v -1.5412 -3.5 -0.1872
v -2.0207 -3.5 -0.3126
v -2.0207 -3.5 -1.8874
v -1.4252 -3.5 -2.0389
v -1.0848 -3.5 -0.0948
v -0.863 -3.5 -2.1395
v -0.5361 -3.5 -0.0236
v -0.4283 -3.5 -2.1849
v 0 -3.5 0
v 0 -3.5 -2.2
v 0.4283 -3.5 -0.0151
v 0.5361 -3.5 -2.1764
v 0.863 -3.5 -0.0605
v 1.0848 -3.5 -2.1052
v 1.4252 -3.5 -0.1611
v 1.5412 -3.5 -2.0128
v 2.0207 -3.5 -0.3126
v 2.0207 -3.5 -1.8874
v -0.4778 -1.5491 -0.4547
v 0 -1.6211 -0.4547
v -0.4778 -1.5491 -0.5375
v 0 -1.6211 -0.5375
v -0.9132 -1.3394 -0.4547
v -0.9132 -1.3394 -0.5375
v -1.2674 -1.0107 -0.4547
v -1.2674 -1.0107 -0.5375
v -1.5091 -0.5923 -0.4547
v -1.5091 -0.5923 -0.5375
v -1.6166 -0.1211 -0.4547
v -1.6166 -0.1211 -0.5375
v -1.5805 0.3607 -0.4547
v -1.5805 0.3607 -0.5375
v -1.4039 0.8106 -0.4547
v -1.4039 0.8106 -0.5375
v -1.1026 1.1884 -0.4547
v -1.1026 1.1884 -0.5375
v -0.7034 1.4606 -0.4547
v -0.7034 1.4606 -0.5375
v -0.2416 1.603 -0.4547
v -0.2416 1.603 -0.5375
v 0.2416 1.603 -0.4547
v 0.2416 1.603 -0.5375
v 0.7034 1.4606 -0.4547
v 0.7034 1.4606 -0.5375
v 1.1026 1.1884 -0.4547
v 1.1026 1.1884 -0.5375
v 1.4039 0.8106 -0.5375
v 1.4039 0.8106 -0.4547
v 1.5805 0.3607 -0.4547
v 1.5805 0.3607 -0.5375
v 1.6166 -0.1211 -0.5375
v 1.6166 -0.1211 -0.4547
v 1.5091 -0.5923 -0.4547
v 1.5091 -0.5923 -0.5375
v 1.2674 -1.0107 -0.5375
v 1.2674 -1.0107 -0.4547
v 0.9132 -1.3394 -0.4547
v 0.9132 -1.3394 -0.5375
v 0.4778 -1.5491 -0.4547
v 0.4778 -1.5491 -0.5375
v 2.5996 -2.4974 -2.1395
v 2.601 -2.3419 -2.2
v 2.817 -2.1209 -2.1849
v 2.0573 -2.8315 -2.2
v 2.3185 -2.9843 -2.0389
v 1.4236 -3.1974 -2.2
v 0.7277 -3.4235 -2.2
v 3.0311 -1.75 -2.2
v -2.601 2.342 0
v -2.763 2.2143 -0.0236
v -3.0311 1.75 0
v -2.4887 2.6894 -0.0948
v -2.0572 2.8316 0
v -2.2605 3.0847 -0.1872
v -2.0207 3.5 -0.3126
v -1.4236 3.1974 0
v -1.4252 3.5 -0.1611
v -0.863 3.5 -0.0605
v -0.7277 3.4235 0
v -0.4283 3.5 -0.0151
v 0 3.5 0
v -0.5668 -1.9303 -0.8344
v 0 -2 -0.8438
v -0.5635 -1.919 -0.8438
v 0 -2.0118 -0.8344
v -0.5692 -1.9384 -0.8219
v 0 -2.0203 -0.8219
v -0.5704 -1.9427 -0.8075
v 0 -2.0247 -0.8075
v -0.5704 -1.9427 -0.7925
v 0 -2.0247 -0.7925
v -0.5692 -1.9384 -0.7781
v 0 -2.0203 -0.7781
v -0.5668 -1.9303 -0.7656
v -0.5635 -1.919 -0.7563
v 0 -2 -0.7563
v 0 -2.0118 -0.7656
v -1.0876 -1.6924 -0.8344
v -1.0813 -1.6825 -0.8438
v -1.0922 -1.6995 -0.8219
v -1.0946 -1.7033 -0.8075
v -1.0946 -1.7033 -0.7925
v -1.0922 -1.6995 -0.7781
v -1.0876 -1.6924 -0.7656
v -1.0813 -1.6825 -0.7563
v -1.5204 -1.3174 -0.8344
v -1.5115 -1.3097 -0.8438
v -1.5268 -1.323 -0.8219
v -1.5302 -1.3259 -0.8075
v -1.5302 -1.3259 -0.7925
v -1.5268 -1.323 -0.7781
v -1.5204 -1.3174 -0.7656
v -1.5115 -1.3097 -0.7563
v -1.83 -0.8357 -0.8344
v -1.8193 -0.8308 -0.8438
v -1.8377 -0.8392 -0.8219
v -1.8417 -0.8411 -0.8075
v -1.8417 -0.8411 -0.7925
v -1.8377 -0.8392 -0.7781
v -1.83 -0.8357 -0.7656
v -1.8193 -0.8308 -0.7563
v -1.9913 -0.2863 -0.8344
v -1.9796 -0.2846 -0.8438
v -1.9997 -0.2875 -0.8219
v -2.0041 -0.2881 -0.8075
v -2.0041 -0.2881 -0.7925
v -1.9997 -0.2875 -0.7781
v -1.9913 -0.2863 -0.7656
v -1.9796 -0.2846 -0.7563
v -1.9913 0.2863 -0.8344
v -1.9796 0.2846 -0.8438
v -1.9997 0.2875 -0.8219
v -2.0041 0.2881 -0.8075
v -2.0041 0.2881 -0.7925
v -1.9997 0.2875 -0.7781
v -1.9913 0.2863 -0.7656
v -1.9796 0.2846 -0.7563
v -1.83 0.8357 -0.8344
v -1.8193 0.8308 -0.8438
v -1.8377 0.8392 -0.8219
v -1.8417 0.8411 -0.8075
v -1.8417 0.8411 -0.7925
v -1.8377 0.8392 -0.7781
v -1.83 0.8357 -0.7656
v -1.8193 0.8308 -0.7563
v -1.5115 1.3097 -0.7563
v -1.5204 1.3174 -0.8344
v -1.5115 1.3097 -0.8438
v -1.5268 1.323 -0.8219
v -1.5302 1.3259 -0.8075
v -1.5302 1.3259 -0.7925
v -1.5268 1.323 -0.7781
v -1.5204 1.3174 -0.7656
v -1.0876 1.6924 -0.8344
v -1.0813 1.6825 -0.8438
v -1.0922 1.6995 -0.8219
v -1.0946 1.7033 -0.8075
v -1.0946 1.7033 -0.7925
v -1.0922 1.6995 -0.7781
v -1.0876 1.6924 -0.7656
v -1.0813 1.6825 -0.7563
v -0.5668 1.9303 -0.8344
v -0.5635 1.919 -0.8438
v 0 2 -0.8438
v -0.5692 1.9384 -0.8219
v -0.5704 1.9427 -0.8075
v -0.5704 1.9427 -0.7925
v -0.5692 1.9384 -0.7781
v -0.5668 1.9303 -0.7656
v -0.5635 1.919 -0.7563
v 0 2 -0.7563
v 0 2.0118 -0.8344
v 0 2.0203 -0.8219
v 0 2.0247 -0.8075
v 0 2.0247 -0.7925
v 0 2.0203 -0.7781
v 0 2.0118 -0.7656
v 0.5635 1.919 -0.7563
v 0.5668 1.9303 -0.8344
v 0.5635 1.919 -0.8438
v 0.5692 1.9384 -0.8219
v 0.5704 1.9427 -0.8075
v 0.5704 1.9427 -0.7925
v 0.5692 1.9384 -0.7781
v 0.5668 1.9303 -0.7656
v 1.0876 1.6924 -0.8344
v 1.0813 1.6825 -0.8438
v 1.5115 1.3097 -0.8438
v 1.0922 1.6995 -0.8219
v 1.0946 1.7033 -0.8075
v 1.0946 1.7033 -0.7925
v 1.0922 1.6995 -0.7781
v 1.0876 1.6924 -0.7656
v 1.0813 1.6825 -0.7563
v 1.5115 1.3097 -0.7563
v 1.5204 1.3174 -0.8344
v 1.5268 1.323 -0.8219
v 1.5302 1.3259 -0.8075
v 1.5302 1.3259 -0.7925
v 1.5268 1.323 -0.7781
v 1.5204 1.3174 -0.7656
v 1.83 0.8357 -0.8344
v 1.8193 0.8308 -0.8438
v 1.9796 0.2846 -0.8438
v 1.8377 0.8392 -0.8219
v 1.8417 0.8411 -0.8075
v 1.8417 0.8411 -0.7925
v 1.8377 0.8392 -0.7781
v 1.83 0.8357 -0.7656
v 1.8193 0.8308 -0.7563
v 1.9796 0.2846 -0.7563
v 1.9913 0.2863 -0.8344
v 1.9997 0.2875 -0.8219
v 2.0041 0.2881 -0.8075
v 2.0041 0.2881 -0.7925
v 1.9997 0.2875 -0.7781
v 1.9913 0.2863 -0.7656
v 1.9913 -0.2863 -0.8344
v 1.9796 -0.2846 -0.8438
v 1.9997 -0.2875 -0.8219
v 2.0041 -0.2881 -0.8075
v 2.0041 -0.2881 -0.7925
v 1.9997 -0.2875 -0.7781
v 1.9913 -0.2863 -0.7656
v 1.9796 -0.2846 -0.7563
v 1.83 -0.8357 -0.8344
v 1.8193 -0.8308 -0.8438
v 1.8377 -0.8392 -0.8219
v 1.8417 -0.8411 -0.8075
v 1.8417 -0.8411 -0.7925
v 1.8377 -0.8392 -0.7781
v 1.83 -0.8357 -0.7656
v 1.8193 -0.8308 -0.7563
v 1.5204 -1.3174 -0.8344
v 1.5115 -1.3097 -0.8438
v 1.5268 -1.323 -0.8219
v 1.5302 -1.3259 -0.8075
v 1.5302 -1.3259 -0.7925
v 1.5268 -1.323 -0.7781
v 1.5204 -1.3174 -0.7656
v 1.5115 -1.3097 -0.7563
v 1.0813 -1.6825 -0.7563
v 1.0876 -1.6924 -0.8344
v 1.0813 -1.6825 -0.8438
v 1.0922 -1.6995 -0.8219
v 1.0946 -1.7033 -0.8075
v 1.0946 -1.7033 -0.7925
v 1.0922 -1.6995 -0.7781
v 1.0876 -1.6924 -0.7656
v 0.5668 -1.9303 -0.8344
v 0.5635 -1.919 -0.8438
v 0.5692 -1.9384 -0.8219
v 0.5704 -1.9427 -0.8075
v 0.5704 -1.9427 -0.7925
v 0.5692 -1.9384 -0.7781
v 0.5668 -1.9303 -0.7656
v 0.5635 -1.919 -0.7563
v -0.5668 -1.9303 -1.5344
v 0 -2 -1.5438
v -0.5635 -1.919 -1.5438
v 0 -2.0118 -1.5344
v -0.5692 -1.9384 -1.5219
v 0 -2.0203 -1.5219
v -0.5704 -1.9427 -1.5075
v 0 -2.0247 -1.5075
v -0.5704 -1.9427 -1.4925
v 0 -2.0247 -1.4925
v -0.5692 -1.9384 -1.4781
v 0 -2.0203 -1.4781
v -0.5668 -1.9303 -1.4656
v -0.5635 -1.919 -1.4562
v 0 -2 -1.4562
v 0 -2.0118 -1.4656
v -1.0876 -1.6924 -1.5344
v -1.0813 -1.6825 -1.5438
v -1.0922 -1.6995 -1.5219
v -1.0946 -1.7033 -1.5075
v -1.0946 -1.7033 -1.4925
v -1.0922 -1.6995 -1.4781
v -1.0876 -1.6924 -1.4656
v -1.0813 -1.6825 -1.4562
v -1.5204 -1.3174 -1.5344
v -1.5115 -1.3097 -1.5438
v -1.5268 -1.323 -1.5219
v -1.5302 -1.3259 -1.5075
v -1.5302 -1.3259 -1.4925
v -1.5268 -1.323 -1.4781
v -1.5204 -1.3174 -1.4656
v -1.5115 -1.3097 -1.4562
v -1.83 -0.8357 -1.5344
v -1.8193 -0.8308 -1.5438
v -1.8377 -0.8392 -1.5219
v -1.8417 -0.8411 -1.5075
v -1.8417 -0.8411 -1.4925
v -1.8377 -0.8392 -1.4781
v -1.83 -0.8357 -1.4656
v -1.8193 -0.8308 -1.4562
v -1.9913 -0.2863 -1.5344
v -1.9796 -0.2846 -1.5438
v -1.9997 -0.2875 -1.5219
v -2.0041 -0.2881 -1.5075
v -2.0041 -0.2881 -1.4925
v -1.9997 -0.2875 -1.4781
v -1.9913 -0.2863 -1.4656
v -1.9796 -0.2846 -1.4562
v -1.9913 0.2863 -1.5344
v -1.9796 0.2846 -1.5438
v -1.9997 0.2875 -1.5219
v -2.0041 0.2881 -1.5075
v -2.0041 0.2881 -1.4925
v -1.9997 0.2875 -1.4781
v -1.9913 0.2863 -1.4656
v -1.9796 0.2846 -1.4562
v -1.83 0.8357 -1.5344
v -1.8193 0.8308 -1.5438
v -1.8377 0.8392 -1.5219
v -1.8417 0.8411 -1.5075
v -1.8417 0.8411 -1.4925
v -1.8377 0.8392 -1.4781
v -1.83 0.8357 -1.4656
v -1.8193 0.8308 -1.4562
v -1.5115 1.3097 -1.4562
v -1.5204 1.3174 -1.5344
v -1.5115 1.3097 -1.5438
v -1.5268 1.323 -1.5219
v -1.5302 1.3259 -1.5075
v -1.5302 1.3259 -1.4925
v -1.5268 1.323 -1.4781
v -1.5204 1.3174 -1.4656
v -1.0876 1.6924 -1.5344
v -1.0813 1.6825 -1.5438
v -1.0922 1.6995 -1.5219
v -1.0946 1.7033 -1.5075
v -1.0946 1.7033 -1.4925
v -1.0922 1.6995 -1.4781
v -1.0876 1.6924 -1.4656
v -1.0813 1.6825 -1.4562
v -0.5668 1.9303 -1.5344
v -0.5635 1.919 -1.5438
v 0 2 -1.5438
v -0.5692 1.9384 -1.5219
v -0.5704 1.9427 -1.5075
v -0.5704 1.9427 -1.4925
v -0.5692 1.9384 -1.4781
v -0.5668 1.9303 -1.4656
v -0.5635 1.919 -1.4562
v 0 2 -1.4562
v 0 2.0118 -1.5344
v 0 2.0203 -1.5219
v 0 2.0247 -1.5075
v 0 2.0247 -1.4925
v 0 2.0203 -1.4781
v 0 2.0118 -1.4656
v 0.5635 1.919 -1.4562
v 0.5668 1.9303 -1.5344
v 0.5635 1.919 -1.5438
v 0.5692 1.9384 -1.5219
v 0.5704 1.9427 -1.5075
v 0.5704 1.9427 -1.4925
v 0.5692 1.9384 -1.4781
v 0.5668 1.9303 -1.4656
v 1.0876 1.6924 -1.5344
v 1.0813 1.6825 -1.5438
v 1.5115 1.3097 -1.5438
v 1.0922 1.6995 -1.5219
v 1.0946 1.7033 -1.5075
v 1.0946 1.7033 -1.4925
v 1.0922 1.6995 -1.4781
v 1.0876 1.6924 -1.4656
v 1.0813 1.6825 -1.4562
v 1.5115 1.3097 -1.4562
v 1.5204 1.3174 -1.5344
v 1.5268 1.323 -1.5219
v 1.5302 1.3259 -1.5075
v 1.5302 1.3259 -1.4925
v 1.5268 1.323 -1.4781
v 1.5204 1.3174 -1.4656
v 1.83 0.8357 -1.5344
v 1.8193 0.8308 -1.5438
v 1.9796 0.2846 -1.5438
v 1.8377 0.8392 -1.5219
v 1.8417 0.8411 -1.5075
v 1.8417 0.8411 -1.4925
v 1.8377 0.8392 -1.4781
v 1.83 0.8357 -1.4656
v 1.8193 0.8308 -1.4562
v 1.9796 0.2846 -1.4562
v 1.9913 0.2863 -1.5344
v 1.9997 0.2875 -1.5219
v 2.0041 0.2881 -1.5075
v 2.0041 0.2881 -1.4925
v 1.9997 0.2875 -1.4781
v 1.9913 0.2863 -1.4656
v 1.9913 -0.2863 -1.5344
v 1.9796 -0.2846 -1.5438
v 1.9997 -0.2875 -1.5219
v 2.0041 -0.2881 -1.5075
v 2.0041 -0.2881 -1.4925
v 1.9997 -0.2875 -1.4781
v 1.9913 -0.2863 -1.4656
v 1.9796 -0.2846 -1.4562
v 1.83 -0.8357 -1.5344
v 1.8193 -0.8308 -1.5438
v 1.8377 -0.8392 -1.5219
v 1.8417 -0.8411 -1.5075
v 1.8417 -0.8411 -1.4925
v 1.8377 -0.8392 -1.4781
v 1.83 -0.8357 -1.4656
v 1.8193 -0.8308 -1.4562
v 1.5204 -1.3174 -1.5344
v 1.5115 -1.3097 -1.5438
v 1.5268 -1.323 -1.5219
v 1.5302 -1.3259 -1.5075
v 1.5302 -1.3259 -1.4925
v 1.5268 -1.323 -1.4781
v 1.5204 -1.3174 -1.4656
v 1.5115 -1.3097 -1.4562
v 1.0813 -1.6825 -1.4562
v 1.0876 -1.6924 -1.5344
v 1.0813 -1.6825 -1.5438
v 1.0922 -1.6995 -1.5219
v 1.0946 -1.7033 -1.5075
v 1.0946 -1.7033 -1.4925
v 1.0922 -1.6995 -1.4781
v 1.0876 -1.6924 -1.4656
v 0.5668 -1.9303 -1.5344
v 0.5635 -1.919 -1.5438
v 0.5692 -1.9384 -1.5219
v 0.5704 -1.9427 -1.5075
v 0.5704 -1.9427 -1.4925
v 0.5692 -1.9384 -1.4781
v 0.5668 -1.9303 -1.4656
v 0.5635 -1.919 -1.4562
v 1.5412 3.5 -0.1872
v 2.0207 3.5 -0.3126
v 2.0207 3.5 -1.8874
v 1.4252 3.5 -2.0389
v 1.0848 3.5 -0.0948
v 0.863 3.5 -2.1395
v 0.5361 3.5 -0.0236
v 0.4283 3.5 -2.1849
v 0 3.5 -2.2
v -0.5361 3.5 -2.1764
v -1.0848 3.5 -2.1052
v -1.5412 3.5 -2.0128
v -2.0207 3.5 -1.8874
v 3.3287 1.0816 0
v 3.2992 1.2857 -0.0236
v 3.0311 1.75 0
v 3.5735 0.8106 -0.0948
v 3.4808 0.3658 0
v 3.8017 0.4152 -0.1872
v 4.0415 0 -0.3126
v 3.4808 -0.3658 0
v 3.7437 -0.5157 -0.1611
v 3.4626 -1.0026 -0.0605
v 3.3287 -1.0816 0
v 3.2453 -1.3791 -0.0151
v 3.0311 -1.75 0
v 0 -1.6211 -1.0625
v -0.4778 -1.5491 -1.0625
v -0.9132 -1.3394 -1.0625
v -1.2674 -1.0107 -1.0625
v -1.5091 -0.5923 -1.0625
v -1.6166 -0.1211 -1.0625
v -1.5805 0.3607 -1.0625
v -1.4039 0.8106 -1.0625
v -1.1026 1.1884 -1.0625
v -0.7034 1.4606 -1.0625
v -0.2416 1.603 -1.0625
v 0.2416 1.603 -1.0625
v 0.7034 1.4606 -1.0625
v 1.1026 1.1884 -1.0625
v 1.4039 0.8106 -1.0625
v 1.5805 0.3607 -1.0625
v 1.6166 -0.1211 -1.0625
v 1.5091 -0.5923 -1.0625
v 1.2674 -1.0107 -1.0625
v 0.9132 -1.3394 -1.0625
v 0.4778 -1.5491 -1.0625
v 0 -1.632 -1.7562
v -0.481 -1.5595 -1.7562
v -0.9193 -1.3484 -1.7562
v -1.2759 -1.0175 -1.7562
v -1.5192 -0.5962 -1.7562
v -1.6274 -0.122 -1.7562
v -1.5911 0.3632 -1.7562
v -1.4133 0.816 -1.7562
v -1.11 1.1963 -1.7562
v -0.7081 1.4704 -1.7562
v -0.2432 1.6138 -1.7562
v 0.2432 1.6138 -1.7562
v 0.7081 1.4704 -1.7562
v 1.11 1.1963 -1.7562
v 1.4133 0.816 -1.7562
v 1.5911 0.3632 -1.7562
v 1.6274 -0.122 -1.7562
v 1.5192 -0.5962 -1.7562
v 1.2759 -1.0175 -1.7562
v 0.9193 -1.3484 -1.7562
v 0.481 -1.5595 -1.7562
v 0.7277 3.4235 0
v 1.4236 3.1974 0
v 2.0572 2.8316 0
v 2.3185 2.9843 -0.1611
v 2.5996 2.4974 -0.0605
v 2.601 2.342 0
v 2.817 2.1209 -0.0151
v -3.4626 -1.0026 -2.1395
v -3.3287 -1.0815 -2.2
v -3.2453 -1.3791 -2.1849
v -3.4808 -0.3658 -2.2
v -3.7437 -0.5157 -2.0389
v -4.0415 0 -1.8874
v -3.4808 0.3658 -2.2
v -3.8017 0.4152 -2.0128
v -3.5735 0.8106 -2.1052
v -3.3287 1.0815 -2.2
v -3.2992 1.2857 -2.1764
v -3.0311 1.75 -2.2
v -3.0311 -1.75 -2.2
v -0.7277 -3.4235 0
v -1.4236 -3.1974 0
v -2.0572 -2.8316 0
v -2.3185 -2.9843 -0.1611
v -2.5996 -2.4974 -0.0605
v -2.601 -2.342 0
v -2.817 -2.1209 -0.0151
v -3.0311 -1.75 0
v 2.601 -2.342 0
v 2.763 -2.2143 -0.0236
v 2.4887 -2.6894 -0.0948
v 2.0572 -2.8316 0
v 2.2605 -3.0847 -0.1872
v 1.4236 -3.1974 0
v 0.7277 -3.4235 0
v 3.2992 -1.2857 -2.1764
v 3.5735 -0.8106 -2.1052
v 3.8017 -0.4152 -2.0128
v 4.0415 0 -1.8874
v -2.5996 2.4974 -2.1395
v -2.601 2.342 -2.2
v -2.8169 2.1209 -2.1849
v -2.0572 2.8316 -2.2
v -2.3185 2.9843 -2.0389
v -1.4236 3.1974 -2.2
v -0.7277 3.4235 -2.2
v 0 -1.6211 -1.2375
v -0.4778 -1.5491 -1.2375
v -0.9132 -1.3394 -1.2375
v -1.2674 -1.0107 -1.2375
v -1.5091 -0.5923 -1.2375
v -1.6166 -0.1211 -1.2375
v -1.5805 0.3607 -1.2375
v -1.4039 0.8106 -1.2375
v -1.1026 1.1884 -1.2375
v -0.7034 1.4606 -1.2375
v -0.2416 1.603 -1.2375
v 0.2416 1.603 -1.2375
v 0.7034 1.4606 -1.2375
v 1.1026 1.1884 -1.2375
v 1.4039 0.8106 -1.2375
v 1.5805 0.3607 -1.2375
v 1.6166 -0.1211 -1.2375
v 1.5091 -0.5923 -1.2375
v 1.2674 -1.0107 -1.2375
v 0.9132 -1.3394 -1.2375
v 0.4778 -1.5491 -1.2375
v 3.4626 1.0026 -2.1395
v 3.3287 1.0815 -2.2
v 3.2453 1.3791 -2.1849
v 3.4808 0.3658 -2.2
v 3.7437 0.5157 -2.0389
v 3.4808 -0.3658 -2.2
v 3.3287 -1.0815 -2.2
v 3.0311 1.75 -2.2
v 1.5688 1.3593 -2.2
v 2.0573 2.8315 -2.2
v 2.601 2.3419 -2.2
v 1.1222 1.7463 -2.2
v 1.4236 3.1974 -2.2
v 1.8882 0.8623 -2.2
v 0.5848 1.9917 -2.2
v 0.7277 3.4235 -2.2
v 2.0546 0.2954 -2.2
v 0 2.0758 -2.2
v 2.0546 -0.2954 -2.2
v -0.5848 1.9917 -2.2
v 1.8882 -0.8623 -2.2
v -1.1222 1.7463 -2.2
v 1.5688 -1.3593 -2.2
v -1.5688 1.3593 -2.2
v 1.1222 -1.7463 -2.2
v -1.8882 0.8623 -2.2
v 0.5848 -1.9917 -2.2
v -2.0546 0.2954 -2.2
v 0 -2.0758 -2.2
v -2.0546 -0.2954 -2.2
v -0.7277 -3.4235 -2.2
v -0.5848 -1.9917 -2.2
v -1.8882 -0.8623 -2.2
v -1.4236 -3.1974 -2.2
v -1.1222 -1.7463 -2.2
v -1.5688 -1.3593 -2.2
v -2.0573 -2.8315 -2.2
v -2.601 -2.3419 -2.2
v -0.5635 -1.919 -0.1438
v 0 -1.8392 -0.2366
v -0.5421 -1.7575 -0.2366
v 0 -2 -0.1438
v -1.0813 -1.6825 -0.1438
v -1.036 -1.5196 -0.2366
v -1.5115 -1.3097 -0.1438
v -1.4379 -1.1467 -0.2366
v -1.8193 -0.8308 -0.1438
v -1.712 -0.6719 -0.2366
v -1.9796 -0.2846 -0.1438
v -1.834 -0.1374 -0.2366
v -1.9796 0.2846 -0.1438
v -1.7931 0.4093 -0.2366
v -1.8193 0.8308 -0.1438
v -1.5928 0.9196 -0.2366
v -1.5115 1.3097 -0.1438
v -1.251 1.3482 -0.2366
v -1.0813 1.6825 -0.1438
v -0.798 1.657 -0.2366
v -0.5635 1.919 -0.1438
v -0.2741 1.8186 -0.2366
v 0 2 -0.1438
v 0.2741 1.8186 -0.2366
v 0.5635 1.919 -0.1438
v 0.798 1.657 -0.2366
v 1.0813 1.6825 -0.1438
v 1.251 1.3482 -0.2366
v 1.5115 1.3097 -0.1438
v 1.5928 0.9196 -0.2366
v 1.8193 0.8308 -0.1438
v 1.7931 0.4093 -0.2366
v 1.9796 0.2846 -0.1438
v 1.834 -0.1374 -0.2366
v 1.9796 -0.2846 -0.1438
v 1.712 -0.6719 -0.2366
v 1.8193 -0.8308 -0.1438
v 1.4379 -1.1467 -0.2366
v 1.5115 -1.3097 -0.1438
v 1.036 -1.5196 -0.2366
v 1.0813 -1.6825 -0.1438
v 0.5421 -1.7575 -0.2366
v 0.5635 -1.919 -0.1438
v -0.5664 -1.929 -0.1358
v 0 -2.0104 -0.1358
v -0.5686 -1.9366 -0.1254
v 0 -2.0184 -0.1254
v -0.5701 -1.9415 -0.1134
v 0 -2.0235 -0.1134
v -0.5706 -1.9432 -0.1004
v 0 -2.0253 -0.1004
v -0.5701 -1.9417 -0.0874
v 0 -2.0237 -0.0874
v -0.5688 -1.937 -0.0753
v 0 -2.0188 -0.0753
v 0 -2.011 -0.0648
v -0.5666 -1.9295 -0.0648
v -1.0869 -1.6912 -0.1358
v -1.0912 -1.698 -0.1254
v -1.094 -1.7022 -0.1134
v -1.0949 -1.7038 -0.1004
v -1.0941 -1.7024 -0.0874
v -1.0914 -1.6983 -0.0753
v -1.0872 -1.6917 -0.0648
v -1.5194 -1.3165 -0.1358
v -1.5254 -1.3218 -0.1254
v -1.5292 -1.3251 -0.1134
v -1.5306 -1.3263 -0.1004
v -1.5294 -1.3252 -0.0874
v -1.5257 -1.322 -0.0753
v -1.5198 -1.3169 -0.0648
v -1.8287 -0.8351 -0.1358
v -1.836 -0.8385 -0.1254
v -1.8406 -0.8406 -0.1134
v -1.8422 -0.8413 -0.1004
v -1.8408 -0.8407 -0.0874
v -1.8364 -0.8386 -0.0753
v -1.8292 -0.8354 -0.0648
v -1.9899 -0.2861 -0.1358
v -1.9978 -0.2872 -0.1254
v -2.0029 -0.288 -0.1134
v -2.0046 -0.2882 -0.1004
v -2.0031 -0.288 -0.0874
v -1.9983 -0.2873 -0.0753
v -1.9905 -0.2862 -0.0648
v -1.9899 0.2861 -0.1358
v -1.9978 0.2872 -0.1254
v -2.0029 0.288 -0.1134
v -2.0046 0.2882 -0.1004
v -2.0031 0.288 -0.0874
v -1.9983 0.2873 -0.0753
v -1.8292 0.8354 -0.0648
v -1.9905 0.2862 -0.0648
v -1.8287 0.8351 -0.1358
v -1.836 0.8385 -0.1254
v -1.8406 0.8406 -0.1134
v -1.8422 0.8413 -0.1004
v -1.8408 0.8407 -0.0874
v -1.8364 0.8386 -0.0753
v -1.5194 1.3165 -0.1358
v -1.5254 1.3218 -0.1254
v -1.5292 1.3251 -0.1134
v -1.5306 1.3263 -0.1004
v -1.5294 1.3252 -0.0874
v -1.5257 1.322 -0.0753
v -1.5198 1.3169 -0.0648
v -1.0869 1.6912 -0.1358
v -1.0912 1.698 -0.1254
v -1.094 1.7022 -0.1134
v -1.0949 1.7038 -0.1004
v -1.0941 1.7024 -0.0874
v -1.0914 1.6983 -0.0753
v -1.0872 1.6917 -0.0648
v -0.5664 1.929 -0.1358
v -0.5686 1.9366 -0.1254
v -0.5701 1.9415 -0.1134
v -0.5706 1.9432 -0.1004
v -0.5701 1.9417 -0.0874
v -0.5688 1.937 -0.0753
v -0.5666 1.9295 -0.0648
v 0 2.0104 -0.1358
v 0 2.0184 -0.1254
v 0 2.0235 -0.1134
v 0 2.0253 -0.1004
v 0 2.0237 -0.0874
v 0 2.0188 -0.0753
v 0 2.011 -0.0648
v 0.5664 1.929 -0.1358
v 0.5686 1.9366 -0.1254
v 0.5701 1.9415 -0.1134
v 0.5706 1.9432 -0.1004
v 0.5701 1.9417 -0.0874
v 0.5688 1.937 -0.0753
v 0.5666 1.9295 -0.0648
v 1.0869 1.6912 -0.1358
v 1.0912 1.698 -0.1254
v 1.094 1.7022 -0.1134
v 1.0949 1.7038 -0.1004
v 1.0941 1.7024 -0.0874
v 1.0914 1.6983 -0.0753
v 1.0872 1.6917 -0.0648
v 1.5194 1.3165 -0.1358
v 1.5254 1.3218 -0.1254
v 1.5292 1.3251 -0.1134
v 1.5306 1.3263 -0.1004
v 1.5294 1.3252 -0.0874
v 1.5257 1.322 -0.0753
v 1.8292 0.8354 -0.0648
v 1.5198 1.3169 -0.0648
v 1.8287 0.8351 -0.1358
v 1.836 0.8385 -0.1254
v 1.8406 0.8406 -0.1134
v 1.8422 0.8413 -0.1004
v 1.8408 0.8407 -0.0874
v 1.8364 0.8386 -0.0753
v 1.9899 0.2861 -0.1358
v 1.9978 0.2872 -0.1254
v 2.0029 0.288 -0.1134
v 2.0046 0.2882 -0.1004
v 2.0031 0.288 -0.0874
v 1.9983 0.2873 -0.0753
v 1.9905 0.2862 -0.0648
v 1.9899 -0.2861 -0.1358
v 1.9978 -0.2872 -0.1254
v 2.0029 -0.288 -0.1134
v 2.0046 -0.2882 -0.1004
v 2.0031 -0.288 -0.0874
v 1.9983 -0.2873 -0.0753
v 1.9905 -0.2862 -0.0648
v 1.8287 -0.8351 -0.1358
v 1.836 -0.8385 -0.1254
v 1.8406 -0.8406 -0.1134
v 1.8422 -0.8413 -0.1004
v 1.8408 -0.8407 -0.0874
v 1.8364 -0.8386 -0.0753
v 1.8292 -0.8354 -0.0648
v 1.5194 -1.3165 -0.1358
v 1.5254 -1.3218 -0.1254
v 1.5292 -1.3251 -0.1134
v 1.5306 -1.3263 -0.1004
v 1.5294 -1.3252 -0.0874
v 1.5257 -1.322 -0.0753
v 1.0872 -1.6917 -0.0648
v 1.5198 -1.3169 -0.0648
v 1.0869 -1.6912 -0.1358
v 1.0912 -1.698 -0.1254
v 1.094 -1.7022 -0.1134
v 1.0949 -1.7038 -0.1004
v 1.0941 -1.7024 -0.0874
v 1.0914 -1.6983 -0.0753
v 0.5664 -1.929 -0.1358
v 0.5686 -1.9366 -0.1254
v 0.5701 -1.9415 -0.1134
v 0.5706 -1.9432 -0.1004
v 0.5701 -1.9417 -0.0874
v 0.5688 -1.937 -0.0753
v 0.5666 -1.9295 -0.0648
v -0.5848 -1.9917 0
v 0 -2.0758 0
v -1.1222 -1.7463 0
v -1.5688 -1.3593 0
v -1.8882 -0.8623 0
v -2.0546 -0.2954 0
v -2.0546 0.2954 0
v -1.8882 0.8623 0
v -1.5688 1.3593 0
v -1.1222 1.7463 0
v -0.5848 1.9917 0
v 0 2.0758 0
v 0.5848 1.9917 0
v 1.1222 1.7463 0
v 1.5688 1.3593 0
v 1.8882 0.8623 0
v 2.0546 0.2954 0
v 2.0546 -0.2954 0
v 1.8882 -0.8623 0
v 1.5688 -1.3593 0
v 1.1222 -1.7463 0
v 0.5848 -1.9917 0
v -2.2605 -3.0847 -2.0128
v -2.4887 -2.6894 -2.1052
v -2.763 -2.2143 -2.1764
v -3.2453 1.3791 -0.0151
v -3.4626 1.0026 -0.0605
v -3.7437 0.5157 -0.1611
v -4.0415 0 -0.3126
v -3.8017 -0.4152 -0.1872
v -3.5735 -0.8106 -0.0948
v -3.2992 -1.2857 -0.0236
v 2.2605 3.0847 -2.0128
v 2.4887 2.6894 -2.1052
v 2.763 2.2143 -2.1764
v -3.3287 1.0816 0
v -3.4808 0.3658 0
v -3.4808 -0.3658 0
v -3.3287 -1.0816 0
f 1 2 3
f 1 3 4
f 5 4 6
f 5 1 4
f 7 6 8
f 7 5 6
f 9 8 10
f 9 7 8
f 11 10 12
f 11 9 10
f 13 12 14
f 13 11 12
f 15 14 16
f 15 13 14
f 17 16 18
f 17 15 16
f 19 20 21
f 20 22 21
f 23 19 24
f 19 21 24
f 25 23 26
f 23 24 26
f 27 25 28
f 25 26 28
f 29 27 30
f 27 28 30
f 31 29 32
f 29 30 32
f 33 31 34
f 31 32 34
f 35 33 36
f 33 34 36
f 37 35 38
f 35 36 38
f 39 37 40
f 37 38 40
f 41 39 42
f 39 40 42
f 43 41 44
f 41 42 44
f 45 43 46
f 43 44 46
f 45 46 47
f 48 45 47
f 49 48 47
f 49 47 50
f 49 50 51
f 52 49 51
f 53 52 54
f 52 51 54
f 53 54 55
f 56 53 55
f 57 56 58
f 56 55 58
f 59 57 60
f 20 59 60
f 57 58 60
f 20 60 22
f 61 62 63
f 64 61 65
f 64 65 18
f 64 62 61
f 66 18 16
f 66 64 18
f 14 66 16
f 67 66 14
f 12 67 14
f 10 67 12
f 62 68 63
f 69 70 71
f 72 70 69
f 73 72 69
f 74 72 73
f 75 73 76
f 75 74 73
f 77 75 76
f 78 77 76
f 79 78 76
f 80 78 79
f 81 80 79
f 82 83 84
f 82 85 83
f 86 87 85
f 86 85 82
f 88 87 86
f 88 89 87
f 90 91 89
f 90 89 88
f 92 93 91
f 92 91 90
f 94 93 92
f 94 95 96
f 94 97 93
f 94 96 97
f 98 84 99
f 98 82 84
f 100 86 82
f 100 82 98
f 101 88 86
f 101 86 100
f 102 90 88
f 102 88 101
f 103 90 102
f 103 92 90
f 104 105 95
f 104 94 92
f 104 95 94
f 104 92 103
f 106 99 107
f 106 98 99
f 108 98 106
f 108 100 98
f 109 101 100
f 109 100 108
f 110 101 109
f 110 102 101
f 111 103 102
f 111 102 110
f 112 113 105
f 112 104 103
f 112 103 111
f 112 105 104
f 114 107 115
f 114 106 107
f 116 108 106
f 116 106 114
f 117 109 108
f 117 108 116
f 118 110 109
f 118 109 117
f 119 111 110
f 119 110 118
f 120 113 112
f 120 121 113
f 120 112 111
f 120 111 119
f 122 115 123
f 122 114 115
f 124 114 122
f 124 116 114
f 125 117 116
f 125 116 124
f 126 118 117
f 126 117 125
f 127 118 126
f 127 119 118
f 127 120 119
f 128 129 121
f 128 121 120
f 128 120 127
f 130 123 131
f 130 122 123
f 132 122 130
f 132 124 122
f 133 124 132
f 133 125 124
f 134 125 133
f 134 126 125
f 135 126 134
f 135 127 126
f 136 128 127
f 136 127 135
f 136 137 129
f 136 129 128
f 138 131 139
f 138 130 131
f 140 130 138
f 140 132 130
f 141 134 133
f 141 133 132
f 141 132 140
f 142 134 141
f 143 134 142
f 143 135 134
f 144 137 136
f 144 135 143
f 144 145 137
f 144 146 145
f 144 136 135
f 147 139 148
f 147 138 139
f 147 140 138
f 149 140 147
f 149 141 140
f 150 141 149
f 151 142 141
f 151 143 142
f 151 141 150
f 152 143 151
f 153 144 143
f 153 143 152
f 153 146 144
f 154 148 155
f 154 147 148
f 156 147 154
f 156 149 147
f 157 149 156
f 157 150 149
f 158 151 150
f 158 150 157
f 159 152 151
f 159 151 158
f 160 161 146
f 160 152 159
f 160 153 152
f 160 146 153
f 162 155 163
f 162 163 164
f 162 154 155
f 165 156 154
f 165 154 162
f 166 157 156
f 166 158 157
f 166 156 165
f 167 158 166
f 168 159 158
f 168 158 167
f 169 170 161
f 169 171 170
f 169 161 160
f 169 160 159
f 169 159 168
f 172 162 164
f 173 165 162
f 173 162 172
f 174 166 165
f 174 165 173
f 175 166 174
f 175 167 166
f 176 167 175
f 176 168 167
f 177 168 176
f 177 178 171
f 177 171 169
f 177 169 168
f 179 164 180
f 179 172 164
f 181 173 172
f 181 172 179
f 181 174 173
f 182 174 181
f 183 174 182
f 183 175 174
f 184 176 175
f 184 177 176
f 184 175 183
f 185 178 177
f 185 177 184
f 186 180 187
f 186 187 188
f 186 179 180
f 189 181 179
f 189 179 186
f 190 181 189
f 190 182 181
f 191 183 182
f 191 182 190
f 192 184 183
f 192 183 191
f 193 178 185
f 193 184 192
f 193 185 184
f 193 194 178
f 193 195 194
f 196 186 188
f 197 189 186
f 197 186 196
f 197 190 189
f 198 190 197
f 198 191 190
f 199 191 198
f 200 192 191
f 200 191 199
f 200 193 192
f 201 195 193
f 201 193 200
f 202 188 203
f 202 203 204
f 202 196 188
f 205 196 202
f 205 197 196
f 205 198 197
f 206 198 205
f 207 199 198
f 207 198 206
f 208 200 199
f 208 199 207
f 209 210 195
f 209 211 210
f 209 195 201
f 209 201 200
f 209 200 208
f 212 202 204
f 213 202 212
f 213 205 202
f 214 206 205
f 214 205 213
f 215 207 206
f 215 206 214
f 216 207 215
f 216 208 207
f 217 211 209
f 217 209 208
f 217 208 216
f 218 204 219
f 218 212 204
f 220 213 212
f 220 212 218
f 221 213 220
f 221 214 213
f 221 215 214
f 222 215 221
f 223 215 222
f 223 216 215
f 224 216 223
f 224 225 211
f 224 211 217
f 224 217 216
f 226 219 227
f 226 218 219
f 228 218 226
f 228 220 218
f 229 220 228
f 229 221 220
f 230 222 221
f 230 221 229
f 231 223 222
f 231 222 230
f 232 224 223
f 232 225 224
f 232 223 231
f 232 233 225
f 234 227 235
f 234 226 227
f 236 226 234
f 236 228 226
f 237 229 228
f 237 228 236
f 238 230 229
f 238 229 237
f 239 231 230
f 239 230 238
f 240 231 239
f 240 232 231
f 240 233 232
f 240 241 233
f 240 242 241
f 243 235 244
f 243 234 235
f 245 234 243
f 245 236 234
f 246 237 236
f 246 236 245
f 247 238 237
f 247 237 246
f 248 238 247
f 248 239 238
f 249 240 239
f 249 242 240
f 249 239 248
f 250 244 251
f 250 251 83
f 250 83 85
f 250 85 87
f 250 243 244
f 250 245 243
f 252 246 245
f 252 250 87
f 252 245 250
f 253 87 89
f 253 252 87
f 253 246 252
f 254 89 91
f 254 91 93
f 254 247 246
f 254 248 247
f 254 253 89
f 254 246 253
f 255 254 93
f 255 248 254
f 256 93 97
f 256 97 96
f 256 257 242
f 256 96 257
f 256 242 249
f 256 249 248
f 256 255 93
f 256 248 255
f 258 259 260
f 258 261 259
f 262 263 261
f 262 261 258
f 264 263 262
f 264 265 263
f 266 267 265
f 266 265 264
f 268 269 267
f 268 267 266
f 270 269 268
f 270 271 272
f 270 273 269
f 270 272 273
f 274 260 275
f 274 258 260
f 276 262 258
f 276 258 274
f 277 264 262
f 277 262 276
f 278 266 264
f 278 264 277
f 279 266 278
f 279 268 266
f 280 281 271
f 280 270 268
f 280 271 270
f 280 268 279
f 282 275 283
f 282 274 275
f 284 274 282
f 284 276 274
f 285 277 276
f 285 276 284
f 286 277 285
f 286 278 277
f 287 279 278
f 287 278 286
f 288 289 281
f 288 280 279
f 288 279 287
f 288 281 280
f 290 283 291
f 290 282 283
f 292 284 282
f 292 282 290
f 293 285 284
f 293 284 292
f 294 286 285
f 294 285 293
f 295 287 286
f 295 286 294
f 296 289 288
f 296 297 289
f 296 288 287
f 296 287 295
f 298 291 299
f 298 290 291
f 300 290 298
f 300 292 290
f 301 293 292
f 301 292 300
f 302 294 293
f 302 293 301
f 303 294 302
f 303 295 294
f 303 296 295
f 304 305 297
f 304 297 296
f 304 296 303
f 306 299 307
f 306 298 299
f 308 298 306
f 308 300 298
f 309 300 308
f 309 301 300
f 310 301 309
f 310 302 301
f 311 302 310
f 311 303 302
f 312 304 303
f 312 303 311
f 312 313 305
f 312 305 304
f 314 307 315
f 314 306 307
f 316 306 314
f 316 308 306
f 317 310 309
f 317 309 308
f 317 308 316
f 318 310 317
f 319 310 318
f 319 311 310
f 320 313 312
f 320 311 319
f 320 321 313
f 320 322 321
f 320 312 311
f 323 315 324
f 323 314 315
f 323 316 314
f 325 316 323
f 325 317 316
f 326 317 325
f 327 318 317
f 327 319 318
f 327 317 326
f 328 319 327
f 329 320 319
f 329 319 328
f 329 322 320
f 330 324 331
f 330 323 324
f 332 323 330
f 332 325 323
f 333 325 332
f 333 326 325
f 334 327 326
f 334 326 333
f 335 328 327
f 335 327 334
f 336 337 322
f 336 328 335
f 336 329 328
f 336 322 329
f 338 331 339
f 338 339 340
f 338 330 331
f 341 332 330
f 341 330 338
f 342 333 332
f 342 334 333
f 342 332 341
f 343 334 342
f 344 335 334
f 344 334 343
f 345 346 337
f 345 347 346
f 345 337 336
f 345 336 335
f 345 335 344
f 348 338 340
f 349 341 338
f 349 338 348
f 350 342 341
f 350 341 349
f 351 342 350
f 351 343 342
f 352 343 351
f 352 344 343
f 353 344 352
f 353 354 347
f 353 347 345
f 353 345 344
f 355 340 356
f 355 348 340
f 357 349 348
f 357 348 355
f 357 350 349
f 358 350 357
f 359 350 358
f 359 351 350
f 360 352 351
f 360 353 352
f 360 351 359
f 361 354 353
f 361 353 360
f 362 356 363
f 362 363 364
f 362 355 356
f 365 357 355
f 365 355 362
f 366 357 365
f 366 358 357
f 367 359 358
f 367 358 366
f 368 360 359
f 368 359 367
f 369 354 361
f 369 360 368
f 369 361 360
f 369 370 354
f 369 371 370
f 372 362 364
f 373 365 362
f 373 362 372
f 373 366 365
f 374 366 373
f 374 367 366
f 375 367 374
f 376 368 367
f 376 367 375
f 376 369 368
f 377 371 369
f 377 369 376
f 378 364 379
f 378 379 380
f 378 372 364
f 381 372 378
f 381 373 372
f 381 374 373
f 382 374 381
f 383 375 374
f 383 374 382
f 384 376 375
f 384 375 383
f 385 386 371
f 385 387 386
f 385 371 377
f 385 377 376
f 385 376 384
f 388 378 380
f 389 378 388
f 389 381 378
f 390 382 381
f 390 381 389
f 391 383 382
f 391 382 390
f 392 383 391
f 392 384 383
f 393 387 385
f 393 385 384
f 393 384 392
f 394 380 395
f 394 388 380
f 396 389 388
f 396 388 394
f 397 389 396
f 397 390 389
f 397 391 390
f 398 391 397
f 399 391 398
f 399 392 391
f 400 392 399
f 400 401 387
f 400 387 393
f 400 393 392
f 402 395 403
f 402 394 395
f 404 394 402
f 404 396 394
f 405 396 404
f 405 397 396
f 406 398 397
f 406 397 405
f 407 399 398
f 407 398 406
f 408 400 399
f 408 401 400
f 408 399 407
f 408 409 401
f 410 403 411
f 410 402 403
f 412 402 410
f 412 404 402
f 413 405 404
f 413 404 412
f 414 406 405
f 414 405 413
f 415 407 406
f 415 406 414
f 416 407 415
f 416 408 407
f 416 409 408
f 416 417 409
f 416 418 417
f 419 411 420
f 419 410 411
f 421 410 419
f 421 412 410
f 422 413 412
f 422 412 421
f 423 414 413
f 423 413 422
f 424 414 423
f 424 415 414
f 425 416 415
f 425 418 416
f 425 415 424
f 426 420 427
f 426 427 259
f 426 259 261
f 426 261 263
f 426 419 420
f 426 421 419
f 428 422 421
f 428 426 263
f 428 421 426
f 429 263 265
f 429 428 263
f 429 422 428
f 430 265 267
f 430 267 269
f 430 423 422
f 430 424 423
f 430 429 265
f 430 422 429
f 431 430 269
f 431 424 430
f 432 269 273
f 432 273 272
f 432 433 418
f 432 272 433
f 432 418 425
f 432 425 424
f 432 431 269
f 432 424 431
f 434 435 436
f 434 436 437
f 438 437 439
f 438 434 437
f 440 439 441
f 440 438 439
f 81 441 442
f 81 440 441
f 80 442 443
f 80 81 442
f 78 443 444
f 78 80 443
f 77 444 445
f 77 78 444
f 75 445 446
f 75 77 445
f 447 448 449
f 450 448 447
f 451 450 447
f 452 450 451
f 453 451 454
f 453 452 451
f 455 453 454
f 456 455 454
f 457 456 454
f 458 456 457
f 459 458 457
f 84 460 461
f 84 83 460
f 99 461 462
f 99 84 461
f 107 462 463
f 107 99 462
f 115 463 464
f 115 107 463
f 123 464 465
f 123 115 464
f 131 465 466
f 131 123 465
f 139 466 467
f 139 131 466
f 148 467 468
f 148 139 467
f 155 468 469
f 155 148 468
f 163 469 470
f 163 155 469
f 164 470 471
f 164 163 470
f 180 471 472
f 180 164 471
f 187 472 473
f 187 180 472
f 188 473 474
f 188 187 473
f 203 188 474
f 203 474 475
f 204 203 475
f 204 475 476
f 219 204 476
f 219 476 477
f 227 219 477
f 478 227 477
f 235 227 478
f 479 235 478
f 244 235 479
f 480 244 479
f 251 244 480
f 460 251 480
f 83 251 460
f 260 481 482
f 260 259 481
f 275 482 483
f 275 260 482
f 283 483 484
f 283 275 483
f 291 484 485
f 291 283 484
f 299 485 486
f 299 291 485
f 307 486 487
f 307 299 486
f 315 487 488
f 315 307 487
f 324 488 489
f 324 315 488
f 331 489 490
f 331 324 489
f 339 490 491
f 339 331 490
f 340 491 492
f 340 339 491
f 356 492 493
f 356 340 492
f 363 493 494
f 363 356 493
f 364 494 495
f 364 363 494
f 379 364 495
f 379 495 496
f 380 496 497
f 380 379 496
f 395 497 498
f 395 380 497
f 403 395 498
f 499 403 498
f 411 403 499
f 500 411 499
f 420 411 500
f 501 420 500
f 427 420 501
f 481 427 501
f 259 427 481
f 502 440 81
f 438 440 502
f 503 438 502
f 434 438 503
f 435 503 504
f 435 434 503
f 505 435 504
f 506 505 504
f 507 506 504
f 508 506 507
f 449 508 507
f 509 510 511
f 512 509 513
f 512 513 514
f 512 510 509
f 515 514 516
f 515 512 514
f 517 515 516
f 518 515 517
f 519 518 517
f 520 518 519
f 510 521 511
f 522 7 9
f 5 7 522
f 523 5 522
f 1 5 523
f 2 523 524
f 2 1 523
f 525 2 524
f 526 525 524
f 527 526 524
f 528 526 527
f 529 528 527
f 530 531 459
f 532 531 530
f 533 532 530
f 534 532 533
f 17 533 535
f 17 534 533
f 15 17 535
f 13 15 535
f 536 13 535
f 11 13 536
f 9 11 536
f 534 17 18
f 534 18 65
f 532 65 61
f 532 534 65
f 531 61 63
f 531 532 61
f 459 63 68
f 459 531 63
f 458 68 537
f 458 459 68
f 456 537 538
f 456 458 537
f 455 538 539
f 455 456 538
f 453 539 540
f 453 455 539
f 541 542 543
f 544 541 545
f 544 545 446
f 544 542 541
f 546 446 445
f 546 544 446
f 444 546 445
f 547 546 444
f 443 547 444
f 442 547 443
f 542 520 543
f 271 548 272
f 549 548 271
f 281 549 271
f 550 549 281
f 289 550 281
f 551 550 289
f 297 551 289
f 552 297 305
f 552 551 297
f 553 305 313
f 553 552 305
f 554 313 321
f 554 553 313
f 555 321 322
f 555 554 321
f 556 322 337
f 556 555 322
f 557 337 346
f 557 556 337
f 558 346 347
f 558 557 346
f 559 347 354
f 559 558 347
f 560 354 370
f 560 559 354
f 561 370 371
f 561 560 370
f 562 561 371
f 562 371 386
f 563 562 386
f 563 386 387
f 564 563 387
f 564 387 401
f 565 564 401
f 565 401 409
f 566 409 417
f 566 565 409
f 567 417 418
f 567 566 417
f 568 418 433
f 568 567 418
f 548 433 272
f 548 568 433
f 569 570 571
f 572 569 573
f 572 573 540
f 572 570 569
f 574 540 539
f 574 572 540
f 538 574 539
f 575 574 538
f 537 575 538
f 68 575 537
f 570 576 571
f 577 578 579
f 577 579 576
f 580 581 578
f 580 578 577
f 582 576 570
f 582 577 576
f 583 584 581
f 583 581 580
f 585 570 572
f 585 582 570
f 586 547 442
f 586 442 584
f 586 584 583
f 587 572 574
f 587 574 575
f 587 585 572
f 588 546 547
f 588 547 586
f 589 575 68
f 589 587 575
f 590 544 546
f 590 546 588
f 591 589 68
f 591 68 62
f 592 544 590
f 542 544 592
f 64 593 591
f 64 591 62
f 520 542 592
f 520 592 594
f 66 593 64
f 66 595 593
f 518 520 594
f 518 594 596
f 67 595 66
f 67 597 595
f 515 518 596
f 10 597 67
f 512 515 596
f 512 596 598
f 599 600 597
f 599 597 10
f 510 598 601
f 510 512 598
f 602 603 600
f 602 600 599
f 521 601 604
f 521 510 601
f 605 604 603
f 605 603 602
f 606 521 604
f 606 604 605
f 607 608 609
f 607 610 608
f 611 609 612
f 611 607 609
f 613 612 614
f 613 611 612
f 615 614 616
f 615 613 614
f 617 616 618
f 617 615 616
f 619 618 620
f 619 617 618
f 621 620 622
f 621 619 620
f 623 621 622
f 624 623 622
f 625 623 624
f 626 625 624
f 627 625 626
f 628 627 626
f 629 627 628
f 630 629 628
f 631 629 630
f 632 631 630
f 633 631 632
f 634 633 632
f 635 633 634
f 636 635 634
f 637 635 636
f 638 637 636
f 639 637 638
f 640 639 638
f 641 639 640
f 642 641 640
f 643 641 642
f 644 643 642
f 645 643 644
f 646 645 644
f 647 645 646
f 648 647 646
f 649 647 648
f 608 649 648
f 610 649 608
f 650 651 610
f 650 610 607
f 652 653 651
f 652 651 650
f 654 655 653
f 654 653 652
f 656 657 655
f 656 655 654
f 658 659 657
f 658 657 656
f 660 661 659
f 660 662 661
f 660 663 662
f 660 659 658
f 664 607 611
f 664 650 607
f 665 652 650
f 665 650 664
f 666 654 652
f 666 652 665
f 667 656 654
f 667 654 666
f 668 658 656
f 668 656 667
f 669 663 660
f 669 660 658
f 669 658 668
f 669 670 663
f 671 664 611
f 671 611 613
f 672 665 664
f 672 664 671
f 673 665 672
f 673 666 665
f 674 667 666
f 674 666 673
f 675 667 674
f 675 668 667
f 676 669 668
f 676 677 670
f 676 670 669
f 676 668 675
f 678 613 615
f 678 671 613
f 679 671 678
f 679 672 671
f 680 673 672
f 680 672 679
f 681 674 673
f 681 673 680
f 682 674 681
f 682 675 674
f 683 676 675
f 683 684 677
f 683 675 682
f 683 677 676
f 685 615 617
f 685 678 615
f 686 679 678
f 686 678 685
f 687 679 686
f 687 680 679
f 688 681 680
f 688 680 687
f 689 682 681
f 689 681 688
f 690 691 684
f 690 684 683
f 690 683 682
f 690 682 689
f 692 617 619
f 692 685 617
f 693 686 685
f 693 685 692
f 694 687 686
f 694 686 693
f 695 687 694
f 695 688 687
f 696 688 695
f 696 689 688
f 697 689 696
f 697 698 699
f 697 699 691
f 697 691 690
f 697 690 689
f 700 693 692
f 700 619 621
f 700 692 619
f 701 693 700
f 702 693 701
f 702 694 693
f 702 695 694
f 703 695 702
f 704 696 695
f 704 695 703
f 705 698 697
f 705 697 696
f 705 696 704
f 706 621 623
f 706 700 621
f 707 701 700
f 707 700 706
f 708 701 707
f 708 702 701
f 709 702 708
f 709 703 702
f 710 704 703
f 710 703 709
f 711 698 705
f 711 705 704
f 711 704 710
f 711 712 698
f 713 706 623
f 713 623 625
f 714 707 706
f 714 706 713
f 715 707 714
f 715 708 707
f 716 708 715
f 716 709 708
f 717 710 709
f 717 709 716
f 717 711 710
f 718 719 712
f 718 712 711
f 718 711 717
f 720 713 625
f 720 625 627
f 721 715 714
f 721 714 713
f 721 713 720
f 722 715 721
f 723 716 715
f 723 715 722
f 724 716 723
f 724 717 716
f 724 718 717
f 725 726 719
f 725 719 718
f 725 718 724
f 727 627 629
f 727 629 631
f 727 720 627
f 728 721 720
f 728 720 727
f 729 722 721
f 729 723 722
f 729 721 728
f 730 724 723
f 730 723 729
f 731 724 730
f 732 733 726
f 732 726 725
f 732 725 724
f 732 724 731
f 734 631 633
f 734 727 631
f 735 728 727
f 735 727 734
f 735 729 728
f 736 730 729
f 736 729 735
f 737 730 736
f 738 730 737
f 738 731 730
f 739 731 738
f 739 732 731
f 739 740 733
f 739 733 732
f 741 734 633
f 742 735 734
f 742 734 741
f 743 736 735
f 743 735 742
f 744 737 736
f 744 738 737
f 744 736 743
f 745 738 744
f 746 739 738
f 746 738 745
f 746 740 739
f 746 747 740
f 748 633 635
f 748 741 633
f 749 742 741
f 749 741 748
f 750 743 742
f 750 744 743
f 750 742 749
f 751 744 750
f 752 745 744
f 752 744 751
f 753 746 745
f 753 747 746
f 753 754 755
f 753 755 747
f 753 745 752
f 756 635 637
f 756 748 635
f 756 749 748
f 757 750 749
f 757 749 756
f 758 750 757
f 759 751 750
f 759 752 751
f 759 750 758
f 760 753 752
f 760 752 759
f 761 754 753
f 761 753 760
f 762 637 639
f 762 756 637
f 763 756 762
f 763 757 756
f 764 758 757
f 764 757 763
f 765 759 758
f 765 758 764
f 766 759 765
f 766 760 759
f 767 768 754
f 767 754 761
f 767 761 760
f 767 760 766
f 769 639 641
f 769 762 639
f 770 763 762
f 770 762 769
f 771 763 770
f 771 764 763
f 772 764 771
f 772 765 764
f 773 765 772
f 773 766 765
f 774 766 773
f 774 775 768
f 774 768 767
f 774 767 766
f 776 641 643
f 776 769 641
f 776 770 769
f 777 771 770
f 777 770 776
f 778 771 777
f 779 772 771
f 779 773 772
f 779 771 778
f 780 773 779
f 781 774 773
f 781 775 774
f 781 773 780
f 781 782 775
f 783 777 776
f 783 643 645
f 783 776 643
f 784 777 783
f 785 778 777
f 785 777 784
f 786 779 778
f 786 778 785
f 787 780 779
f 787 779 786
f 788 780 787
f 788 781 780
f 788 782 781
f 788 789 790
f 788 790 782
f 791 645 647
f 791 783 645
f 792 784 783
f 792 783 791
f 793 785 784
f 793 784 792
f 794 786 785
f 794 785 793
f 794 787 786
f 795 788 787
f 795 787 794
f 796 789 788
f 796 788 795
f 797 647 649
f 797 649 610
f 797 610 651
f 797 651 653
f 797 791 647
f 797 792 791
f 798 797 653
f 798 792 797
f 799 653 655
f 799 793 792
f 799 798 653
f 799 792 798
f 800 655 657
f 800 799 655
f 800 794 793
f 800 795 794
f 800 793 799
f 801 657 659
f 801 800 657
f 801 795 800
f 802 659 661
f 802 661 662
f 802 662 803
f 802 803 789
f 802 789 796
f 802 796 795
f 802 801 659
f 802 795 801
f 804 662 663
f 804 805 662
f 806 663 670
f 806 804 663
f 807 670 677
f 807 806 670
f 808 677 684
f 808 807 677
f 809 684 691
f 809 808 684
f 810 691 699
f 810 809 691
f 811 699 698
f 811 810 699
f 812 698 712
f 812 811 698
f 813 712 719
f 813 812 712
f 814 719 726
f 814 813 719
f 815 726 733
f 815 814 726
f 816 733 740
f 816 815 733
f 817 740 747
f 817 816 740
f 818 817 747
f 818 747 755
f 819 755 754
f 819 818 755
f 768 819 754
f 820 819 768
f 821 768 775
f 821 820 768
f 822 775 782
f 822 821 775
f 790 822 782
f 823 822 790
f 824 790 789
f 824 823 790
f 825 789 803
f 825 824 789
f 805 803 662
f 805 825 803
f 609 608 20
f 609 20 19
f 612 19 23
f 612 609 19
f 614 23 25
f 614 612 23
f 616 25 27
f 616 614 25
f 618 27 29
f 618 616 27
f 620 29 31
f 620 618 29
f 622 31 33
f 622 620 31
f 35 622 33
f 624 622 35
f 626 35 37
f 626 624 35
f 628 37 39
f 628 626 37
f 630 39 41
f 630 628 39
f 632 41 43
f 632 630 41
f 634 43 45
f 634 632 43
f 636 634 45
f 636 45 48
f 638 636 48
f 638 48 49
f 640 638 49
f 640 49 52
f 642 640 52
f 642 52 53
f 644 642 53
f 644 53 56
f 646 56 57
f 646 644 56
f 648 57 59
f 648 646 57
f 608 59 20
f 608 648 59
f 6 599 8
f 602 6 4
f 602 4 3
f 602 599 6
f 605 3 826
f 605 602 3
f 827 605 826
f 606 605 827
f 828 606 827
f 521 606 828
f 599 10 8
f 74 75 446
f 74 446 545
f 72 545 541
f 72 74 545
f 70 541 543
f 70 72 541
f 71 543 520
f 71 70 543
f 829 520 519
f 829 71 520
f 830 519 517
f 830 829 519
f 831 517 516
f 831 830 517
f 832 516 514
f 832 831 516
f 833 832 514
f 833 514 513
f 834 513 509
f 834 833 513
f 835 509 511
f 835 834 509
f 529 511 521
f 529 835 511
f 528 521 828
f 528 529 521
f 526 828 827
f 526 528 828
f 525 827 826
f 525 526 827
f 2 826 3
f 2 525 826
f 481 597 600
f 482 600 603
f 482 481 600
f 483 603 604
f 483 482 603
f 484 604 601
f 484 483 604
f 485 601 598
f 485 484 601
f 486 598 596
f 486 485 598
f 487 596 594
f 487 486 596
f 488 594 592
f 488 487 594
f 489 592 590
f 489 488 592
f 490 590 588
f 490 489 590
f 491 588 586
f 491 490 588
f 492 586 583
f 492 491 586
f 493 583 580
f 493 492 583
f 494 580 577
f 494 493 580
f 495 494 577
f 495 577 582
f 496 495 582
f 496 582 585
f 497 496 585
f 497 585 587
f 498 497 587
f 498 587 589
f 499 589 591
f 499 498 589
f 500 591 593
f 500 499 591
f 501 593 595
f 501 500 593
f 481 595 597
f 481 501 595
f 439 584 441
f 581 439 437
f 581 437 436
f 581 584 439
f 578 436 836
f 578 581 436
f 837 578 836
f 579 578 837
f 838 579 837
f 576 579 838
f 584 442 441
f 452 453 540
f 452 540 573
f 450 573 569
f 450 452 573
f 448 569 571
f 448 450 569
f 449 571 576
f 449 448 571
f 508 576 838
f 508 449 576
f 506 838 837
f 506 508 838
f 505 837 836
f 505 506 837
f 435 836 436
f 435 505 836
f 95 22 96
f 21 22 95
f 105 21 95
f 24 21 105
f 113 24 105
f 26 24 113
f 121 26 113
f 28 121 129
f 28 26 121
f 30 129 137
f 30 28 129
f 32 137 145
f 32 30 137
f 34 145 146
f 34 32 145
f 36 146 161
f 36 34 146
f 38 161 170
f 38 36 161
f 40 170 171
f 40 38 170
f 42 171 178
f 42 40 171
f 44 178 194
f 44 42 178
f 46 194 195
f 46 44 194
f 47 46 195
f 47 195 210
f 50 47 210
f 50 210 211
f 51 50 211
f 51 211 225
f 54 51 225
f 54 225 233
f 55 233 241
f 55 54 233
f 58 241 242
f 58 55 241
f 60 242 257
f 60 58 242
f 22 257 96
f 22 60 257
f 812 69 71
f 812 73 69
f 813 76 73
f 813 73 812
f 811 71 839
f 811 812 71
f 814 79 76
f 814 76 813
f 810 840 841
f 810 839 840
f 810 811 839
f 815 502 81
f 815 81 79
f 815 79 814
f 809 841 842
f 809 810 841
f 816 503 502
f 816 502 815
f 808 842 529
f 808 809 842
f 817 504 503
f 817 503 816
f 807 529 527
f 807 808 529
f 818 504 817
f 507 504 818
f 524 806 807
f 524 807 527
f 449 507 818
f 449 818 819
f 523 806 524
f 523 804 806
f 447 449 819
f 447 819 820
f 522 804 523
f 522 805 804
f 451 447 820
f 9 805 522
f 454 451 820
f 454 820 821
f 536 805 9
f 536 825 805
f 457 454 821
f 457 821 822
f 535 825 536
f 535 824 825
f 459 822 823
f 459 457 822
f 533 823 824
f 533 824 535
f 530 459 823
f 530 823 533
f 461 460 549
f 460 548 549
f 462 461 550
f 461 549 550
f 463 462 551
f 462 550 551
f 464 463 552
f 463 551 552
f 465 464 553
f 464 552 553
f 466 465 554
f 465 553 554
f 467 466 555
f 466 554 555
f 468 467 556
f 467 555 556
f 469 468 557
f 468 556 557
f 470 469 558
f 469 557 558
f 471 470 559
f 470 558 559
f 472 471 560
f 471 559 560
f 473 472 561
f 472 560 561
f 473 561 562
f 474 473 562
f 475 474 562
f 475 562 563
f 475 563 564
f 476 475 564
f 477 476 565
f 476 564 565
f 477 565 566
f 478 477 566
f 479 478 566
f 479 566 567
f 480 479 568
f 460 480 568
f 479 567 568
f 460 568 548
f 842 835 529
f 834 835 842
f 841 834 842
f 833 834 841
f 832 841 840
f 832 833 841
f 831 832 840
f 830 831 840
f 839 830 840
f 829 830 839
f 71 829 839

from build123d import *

# Parameters (mm, degrees)
SKETCH5_W               = 2.2
SKETCH5_H               = 7
SKETCH7_W               = 2.2
SKETCH7_H               = 2
SKETCH9_W               = 2.2
SKETCH9_H               = 0.454663337
THREAD_SIMPLE_COUNT     = 4
THREAD_SIMPLE_PITCH     = 0.7
SKETCH22_OUTSIDE_W      = 15.9
SKETCH22_OUTSIDE_H      = 15.9
CUT_PROFILE_OUTER_DEPTH = 3.2


with BuildPart() as part:
    # Sketch5 → body (revolve)
    with BuildSketch(Plane(origin=(0, 0, 0), x_dir=(0, 0, -1), z_dir=(1, 0, 0))):
        with Locations((1.1, 3.5)):
            Rectangle(SKETCH5_W, SKETCH5_H)
    revolve(axis=Axis((0, 0, 0), (0, 0, -1)))

    # Sketch19 → cut-chamfer-start (revolve, cut)
    with BuildSketch(Plane(origin=(0, 0, 0), x_dir=(0, 0, -1), z_dir=(1, 0, 0))):
        Polygon((2.020725942, -7), (0, -7), (0, -3.5), align=None)
    revolve(axis=Axis((0, 0, 0), (0, 0, -1)), mode=Mode.SUBTRACT)

    # Sketch20 → cut-chamfer-end (revolve, cut)
    with BuildSketch(Plane(origin=(0, 0, 0), x_dir=(0, 0, -1), z_dir=(1, 0, 0))):
        Polygon((2.2, -7), (0.179274058, -7), (2.2, -3.5), align=None)
    revolve(axis=Axis((0, 0, 0), (0, 0, -1)), mode=Mode.SUBTRACT)

    # Sketch7 → body-bore (revolve, cut)
    with BuildSketch(Plane(origin=(0, 0, 0), x_dir=(0, 0, -1), z_dir=(1, 0, 0))):
        with Locations((1.1, 1)):
            Rectangle(SKETCH7_W, SKETCH7_H)
    revolve(axis=Axis((0, 0, -2.2), (0, 0, 1)), mode=Mode.SUBTRACT)

    # Sketch9 → body-thread (revolve)
    with BuildSketch(Plane(origin=(0, 0, 0), x_dir=(0, 0, -1), z_dir=(1, 0, 0))):
        with Locations((1.1, -1.848445555)):
            Rectangle(SKETCH9_W, SKETCH9_H)
    revolve(axis=Axis((0, 0, 0), (0, 0, -1)))

    # Sketch10 → thread-single (revolve, cut)
    with BuildSketch(Plane(origin=(0, 0, 0), x_dir=(0, 0, -1), z_dir=(1, 0, 0))):
        with BuildLine():
            Line((2.15625, -2), (1.9375, -1.621113886))
            Line((1.9375, -1.621113886), (2.4625, -1.621113886))
            Line((2.4625, -1.621113886), (2.24375, -2))
            ThreePointArc((2.24375, -2), (2.2, -2.025259074), (2.15625, -2))
        make_face()
    thread_single = revolve(axis=Axis((0, 0, 0), (0, 0, -1)), mode=Mode.SUBTRACT)

    # thread-simple: thread-single ×4
    with Locations(*[(0, 0, i * THREAD_SIMPLE_PITCH) for i in range(1, THREAD_SIMPLE_COUNT)]):
        add(thread_single, mode=Mode.SUBTRACT)

    # Sketch15 → cut-chamfer-start-inner (revolve, cut)
    with BuildSketch(Plane(origin=(0, 0, 0), x_dir=(0, 0, -1), z_dir=(1, 0, 0))):
        Polygon((0, -1.621113886), (0.454663337, -1.621113886), (0, -2.075777223), align=None)
    revolve(axis=Axis((0, 0, 0), (0, 0, -1)), mode=Mode.SUBTRACT)

    # Sketch16 → cut-chamfer-end-inner (revolve, cut)
    with BuildSketch(Plane(origin=(0, 0, 0), x_dir=(0, 0, -1), z_dir=(1, 0, 0))):
        Polygon((2.2, -1.621113886), (2.2, -2.075777223), (1.745336663, -1.621113886), align=None)
    revolve(axis=Axis((0, 0, 0), (0, 0, -1)), mode=Mode.SUBTRACT)

    # Sketch22 outside → cut-profile-outer (cut, through all)
    with BuildSketch(Plane.XY):
        Rectangle(SKETCH22_OUTSIDE_W, SKETCH22_OUTSIDE_H)
        Polygon((4.041451884, 0), (2.020725942, 3.5), (-2.020725942, 3.5), (-4.041451884, 0), (-2.020725942, -3.5), (2.020725942, -3.5), align=None, mode=Mode.SUBTRACT)
    extrude(amount=-CUT_PROFILE_OUTER_DEPTH, mode=Mode.SUBTRACT)


solid = part.part
